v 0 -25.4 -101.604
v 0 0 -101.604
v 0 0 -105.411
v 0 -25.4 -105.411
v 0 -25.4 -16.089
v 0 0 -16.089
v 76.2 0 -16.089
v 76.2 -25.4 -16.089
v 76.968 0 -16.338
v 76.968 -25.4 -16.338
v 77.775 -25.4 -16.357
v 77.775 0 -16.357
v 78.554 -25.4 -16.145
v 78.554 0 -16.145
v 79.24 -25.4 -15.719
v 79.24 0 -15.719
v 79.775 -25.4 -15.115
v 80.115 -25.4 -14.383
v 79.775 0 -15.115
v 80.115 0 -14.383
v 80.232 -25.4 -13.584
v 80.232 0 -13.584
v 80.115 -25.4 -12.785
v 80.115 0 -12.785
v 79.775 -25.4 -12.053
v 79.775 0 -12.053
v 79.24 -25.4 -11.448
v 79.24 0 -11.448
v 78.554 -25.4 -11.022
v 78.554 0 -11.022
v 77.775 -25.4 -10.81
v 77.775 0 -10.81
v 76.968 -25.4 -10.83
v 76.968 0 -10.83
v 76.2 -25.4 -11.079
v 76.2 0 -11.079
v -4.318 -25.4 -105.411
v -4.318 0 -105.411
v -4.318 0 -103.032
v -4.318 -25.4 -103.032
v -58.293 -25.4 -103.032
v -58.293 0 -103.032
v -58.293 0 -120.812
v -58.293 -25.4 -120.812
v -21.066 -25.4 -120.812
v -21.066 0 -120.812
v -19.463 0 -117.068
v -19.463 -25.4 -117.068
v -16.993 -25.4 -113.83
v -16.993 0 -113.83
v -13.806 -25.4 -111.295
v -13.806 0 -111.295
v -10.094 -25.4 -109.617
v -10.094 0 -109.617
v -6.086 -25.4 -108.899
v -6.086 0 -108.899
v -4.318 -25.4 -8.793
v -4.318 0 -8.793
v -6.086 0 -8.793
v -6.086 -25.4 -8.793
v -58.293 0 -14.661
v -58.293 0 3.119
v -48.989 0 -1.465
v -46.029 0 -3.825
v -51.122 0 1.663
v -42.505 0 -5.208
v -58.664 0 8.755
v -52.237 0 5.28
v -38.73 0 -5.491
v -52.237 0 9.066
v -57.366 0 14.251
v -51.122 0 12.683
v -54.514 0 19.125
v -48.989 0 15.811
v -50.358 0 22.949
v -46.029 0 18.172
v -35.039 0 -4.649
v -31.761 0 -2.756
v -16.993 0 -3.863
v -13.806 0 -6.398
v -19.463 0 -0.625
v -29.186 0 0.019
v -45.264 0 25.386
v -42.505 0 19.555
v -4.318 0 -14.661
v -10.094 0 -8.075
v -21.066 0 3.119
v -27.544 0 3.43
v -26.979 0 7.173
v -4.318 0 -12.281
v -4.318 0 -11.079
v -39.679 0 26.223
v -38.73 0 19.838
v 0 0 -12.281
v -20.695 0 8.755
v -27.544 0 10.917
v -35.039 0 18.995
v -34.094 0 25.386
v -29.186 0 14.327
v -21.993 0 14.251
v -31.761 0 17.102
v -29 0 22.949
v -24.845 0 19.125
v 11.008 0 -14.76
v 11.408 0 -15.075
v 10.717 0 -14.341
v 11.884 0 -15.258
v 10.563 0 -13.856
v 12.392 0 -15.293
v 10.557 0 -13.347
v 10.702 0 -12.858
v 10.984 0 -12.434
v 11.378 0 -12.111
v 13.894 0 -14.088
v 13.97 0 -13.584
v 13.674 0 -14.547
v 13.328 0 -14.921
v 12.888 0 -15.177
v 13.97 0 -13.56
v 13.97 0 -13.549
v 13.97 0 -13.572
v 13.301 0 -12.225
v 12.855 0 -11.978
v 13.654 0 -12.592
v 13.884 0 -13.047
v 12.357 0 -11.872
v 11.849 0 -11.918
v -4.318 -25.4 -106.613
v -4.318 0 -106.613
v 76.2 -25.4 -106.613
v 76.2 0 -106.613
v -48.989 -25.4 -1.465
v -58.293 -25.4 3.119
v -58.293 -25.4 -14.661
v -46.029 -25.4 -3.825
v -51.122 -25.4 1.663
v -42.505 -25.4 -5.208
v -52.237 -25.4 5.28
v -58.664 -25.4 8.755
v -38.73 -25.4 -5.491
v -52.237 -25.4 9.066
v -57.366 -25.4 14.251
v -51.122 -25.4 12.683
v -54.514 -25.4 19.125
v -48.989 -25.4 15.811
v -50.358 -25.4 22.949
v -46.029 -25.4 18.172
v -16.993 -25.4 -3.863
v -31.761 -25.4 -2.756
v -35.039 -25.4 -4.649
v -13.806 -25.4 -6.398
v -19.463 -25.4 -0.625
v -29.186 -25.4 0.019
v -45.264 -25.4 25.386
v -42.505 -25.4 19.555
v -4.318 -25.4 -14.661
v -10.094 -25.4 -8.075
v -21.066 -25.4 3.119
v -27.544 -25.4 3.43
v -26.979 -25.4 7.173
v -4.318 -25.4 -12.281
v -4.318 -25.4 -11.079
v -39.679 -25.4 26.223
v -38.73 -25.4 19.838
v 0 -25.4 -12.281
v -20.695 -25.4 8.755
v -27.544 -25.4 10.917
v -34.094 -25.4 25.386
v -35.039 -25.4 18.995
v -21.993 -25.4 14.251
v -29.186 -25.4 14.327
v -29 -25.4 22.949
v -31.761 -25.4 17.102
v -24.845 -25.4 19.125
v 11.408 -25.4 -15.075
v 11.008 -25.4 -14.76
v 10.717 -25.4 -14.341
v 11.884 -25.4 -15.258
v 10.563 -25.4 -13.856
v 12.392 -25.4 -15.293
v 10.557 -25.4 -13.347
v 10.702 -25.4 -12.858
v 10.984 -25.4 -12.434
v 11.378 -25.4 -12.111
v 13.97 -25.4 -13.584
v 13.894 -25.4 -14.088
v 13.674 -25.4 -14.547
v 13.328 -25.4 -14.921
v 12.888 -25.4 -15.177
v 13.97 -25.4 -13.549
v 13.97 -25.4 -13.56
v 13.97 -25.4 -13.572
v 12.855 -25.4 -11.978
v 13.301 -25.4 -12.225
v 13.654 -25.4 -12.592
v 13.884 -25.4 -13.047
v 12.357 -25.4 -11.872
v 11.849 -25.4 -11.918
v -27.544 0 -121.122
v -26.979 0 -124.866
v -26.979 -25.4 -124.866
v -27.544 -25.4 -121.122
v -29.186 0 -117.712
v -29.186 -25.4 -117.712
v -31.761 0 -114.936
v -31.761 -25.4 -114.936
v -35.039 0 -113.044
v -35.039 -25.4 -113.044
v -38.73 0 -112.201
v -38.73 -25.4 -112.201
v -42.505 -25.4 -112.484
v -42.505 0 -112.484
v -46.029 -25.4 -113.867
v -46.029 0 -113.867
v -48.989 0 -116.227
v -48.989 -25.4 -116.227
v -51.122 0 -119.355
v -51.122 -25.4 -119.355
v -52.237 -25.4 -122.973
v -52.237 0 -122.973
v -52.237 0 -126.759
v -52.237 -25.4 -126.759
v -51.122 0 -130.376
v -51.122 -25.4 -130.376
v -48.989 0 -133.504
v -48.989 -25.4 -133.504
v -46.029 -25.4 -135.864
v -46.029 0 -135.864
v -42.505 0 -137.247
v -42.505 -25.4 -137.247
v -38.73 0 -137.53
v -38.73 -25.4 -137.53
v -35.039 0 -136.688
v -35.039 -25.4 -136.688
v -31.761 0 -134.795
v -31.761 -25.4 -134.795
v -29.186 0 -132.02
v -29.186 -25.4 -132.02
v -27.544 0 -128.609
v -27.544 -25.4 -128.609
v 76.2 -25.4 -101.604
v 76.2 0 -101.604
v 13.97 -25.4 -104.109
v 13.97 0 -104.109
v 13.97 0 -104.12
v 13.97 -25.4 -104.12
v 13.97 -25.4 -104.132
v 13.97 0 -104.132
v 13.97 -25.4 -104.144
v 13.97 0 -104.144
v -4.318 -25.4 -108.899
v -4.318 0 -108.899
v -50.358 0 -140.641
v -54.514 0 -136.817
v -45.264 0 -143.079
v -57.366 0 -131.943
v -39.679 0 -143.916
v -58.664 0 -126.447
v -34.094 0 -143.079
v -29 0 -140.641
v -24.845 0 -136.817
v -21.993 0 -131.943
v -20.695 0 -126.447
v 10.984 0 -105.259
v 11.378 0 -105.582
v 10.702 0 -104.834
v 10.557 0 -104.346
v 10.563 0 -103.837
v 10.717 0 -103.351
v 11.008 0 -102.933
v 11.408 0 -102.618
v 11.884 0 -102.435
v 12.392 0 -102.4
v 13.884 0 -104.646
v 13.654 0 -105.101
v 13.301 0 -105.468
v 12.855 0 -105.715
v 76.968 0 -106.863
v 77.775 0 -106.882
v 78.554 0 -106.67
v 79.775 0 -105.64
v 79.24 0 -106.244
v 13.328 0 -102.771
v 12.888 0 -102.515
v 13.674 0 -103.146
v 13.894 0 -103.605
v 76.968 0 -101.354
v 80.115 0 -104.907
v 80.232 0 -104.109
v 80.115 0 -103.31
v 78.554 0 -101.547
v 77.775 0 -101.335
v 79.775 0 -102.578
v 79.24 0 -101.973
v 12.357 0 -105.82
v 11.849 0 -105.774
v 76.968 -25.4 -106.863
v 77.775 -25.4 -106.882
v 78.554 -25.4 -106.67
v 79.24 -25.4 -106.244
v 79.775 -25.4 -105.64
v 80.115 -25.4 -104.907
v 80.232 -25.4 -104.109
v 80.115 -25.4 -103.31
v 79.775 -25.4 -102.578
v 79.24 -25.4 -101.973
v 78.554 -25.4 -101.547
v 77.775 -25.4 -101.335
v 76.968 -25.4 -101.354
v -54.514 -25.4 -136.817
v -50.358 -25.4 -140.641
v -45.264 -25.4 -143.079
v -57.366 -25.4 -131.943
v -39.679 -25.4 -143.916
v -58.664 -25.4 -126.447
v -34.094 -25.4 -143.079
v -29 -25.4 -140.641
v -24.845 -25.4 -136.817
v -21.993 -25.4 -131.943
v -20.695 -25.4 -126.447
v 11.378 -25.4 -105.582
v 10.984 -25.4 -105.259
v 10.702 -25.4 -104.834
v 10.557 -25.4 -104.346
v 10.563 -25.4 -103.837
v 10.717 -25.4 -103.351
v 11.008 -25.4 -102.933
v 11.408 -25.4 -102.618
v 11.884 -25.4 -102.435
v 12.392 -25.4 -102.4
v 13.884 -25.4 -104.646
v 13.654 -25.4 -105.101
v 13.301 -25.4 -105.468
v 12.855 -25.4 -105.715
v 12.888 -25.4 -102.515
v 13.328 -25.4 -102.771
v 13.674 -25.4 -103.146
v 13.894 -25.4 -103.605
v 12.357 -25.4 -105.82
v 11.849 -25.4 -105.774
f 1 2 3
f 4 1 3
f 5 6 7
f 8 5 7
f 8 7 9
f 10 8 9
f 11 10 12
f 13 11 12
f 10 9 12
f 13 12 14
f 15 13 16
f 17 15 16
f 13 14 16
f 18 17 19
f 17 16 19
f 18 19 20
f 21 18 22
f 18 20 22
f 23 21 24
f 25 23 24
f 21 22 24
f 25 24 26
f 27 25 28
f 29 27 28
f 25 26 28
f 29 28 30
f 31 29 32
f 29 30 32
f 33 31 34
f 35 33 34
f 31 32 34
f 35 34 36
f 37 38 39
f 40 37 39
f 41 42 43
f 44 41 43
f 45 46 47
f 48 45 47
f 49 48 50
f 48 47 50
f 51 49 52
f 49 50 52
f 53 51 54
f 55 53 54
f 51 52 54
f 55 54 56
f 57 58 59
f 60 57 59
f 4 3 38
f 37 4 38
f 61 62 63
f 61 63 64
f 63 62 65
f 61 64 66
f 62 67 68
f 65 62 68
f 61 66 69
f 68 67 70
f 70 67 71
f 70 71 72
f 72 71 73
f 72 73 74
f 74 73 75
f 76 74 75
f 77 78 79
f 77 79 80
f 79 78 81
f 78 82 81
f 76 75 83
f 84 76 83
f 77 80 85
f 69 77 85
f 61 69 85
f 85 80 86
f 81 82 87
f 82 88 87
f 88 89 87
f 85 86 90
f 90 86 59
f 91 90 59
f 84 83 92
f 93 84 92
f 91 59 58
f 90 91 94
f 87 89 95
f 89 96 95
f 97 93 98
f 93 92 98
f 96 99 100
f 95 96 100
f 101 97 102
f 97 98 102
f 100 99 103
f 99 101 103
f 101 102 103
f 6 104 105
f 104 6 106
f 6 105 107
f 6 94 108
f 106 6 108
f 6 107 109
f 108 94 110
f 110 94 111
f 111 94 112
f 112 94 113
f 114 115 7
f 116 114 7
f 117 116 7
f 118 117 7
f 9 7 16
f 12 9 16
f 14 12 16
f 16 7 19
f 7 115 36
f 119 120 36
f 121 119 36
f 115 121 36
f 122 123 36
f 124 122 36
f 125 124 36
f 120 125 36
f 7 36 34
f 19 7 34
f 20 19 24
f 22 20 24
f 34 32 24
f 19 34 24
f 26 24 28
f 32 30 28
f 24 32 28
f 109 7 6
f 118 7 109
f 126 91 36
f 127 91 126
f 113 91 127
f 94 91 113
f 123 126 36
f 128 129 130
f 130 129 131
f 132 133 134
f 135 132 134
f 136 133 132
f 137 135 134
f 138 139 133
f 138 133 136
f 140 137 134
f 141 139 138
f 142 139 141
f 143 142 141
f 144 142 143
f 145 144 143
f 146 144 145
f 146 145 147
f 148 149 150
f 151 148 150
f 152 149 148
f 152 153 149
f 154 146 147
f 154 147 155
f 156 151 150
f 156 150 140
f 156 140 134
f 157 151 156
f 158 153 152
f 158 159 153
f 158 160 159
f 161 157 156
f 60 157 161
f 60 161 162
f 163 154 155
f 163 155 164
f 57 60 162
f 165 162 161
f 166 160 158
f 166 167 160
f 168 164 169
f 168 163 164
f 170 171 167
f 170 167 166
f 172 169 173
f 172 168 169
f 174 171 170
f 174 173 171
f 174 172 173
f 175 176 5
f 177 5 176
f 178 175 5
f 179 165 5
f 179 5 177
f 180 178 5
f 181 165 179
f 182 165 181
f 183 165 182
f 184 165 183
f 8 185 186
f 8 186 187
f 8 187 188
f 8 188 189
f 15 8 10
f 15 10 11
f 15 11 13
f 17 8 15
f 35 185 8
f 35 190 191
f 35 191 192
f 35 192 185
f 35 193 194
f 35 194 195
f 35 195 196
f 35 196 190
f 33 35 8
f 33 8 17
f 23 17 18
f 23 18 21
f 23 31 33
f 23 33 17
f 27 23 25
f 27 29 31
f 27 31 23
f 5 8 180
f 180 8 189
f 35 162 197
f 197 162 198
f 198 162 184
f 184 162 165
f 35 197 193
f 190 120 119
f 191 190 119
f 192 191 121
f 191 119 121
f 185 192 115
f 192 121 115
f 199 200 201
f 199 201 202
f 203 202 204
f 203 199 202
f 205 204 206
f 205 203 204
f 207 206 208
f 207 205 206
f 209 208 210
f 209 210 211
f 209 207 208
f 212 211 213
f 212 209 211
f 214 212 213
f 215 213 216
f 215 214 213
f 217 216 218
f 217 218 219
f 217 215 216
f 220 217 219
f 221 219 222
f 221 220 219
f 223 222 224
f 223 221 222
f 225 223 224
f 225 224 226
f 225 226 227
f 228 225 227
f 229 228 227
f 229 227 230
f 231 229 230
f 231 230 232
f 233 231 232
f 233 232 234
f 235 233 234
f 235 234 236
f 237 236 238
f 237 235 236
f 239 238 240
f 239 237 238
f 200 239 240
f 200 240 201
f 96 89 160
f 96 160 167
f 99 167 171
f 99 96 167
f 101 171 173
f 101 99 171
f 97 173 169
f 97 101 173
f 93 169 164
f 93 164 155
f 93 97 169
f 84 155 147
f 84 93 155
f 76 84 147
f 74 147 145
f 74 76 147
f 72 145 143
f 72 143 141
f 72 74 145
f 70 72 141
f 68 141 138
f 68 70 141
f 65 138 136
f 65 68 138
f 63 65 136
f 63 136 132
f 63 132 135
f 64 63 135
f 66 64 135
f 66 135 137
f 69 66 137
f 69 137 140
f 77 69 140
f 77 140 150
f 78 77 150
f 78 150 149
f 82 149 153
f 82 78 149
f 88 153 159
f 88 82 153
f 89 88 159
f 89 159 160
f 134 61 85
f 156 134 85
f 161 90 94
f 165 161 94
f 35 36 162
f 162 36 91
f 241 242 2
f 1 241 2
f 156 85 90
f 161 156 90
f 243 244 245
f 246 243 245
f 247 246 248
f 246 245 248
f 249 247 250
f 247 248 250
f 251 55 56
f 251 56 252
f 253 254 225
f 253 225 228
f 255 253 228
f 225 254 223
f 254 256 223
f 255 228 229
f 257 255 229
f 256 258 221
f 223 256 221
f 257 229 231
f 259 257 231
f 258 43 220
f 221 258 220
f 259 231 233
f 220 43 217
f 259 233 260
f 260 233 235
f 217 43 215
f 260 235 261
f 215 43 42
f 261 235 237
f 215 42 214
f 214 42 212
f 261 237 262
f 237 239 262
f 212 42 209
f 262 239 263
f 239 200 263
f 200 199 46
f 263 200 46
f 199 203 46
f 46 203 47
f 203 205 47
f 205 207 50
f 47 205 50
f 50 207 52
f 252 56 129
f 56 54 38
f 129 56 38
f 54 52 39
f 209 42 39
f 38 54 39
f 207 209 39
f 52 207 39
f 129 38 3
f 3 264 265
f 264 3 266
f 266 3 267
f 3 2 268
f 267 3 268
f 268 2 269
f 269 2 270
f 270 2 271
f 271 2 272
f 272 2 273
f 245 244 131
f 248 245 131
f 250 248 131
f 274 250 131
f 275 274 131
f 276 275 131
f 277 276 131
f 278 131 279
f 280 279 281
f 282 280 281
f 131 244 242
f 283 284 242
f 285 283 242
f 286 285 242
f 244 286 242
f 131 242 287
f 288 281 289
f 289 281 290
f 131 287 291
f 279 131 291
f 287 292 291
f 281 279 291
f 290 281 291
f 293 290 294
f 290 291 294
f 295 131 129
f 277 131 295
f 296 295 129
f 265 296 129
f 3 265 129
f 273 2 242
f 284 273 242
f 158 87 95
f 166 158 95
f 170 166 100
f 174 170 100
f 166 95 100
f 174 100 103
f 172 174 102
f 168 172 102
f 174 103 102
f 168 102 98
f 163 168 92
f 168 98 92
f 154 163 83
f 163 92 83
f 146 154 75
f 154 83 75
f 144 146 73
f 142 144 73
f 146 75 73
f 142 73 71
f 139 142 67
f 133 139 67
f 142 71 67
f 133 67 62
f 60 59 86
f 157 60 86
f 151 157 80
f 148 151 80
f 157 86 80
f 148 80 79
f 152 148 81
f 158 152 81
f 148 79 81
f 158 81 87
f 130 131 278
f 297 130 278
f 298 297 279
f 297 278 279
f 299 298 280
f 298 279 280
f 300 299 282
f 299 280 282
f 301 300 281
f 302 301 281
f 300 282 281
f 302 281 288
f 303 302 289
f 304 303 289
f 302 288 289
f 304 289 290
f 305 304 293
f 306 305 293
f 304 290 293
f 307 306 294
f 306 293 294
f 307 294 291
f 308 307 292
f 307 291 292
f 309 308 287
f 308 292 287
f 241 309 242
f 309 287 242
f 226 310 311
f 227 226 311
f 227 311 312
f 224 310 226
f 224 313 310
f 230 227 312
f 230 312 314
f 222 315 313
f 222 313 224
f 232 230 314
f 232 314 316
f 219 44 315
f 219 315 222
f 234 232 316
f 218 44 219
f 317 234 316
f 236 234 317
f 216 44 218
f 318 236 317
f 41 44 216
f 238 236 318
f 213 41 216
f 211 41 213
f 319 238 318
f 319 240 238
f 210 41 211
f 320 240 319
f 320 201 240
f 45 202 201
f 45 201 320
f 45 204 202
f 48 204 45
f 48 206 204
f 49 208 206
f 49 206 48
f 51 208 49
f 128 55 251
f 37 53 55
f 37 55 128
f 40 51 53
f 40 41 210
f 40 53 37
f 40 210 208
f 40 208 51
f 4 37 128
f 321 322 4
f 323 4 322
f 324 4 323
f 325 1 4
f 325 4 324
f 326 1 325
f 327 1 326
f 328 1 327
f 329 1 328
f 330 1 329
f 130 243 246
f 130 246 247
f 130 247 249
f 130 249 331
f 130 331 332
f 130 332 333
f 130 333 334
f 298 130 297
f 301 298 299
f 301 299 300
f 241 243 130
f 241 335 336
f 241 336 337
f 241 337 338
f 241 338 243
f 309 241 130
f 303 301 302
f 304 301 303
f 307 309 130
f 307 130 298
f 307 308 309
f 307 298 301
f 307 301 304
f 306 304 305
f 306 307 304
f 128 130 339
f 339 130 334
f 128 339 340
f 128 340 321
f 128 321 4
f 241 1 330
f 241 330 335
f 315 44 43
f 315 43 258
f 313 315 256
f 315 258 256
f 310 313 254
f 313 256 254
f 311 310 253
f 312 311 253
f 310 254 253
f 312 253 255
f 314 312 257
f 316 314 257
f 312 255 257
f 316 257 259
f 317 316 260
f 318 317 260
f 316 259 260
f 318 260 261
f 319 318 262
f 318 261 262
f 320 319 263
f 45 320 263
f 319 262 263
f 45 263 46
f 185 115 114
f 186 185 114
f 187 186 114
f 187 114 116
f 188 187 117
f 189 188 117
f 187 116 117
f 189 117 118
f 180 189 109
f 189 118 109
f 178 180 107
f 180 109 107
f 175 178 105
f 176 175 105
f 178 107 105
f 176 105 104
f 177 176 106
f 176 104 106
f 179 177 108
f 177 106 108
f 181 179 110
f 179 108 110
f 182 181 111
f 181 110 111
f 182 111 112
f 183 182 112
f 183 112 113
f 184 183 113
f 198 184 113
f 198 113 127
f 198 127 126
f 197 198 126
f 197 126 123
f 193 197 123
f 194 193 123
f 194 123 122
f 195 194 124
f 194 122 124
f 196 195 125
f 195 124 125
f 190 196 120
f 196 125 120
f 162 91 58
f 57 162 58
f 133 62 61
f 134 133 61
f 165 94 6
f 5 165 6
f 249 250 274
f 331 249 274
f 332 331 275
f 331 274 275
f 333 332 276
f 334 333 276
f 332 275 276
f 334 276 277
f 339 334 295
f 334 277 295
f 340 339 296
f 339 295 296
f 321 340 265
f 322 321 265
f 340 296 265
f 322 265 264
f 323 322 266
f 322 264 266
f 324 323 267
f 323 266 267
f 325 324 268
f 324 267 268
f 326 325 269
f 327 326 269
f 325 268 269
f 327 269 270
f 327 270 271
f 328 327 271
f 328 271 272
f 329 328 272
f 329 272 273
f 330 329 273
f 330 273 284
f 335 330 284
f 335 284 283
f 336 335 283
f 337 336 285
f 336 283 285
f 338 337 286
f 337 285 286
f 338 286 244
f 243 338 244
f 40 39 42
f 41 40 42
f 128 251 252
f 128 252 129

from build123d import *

# Parameters (mm, degrees)
F0_R     = 12.7
F1_DEPTH = 25.4


with BuildPart() as f1:
    # F0 (on Front) → F1 (new body)
    with BuildSketch(Plane.XZ):
        with BuildLine():
            Line((-58.293, 3.119478), (-58.293, -14.660522))
            Line((-58.293, -14.660522), (-4.318, -14.660522))
            Line((-4.318, -14.660522), (-4.318, -12.281183))
            Line((-4.318, -12.281183), (-4.318, -11.079122))
            Line((-4.318, -11.079122), (-4.318, -8.793122))
            ThreePointArc((-4.318, -8.793122), (-5.201756, -8.816792), (-6.085512, -8.793122))
            ThreePointArc((-6.085512, -8.793122), (-15.477841, -5.228951), (-21.065586, 3.119478))
            ThreePointArc((-21.065586, 3.119478), (-39.679293, 26.223168), (-58.293, 3.119478))
        make_face()
        with Locations((-39.679293, 7.173168)):
            Circle(F0_R, mode=Mode.SUBTRACT)
        with BuildLine():
            Line((-4.318, -11.079122), (-4.318, -12.281183))
            Line((-4.318, -12.281183), (0, -12.281183))
            Line((0, -12.281183), (0, -16.088655))
            Line((0, -16.088655), (76.2, -16.088655))
            ThreePointArc((76.2, -16.088655), (80.231974, -13.583889), (76.2, -11.079122))
            Line((76.2, -11.079122), (-4.318, -11.079122))
        make_face()
        with BuildLine():
            ThreePointArc((13.969638, -13.548655), (13.969909, -13.566271), (13.97, -13.583889))
            ThreePointArc((13.97, -13.583889), (10.541091, -13.601506), (13.969638, -13.548655))
        make_face(mode=Mode.SUBTRACT)
        with BuildLine():
            Line((-4.318, -8.793122), (-6.085512, -8.793122))
            ThreePointArc((-6.085512, -8.793122), (-5.201756, -8.816792), (-4.318, -8.793122))
        make_face()
        with BuildLine():
            Line((-4.318, -105.411317), (-4.318, -103.031978))
            Line((-4.318, -103.031978), (-58.293, -103.031978))
            Line((-58.293, -103.031978), (-58.293, -120.811978))
            ThreePointArc((-58.293, -120.811978), (-39.679293, -143.915668), (-21.065586, -120.811978))
            ThreePointArc((-21.065586, -120.811978), (-15.477841, -112.463549), (-6.085512, -108.899378))
            ThreePointArc((-6.085512, -108.899378), (-5.201756, -108.875708), (-4.318, -108.899378))
            Line((-4.318, -108.899378), (-4.318, -106.613378))
            Line((-4.318, -106.613378), (-4.318, -105.411317))
        make_face()
        with Locations((-39.679293, -124.865668)):
            Circle(F0_R, mode=Mode.SUBTRACT)
        with BuildLine():
            Line((0, -105.411317), (-4.318, -105.411317))
            Line((-4.318, -105.411317), (-4.318, -106.613378))
            Line((-4.318, -106.613378), (76.2, -106.613378))
            ThreePointArc((76.2, -106.613378), (80.231974, -104.108612), (76.2, -101.603845))
            Line((76.2, -101.603845), (0, -101.603845))
            Line((0, -101.603845), (0, -105.411317))
        make_face()
        with BuildLine():
            ThreePointArc((13.969638, -104.143845), (10.541091, -104.090994), (13.97, -104.108612))
            ThreePointArc((13.97, -104.108612), (13.969909, -104.126229), (13.969638, -104.143845))
        make_face(mode=Mode.SUBTRACT)
        with BuildLine():
            Line((-6.085512, -108.899378), (-4.318, -108.899378))
            ThreePointArc((-4.318, -108.899378), (-5.201756, -108.875708), (-6.085512, -108.899378))
        make_face()
    extrude(amount=F1_DEPTH)


solid = f1.part
